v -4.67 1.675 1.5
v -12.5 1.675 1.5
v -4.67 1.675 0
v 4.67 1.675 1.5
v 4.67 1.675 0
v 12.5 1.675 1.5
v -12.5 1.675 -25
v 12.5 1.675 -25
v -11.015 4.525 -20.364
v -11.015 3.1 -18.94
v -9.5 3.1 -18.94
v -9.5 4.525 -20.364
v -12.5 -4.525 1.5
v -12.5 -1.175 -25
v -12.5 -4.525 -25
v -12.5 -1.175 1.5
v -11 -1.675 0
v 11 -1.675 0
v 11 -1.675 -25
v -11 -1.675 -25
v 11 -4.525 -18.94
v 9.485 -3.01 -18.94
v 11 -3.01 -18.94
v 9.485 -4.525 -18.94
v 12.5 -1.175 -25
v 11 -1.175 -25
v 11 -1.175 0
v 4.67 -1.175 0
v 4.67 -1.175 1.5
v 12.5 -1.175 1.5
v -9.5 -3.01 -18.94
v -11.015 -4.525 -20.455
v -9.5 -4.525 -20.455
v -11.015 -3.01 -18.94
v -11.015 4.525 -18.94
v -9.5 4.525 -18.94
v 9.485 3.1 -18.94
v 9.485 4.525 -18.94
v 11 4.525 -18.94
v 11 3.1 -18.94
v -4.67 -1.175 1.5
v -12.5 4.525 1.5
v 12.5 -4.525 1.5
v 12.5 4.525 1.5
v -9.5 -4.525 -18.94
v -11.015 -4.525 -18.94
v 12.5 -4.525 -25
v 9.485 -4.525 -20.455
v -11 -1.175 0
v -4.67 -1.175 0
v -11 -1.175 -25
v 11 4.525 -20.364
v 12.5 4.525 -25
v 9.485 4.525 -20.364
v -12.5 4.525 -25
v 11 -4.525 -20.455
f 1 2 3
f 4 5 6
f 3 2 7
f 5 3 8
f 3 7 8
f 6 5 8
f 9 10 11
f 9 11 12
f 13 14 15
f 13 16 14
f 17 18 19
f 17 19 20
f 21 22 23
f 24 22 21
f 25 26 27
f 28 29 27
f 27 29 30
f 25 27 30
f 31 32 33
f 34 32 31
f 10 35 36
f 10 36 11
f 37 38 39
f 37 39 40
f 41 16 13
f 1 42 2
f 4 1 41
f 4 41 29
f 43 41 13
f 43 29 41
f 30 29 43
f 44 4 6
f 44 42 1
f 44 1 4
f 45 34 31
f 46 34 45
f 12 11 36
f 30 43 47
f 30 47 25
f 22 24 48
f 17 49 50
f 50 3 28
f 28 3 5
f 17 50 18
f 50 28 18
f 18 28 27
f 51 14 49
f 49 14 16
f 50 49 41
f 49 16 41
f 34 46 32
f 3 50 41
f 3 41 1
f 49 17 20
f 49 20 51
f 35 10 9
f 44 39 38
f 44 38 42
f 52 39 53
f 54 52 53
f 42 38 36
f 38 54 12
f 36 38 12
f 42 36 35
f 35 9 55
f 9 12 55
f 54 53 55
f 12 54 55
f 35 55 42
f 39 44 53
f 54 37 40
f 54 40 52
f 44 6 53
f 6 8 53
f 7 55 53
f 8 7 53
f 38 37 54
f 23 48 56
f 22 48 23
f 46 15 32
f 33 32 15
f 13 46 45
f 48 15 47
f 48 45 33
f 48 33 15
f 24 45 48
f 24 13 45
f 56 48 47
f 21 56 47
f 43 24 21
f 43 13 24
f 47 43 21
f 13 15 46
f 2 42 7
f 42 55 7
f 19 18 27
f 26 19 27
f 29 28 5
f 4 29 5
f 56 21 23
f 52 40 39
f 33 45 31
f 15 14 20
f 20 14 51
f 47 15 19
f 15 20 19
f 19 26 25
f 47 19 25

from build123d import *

# Parameters (mm, degrees)
SKETCH1_W           = 9.34
SKETCH1_H           = 3.35
SKETCH1_W_2         = 1.5
SKETCH1_H_2         = 0.5
SKETCH1_W_3         = 6.33
BOSS_EXTRUDE1_DEPTH = 1.5
SKETCH1_6_W         = 1.5
SKETCH1_6_H         = 0.5
BOSS_EXTRUDE4_DEPTH = 25
CAVITY1_START       = -11.015
CAVITY1_DEPTH       = 1.515
CAVITY1_START_2     = 9.485
CAVITY1_2_DEPTH     = 1.515


# Read off the part's stored shape, not the designer's step: Cavity1
with BuildPart() as part:
    # Sketch1 → Boss-Extrude1 (new body)
    with BuildSketch(Plane.XY):
        Rectangle(SKETCH1_W, SKETCH1_H)
        Polygon((11, -1.675), (4.67, -1.675), (-4.67, -1.675), (-11, -1.675), (-12.5, -1.675), (-12.5, -4.525), (12.5, -4.525), (12.5, -1.675), align=None)
        Polygon((-4.67, 1.675), (4.67, 1.675), (12.5, 1.675), (12.5, 4.525), (-12.5, 4.525), (-12.5, 1.675), align=None)
        with Locations((11.75, -1.425)):
            Rectangle(SKETCH1_W_2, SKETCH1_H_2)
        with Locations((7.835, -1.425)):
            Rectangle(SKETCH1_W_3, SKETCH1_H_2)
        with Locations((-11.75, -1.425)):
            Rectangle(SKETCH1_W_2, SKETCH1_H_2)
        with Locations((-7.835, -1.425)):
            Rectangle(SKETCH1_W_3, SKETCH1_H_2)
    extrude(amount=BOSS_EXTRUDE1_DEPTH)

    # Sketch1<6> → Boss-Extrude4 (add)
    with BuildSketch(Plane.XY):
        Polygon((11, -1.675), (4.67, -1.675), (-4.67, -1.675), (-11, -1.675), (-12.5, -1.675), (-12.5, -4.525), (12.5, -4.525), (12.5, -1.675), align=None)
        Polygon((-4.67, 1.675), (4.67, 1.675), (12.5, 1.675), (12.5, 4.525), (-12.5, 4.525), (-12.5, 1.675), align=None)
        with Locations((11.75, -1.425)):
            Rectangle(SKETCH1_6_W, SKETCH1_6_H)
        with Locations((-11.75, -1.425)):
            Rectangle(SKETCH1_6_W, SKETCH1_6_H)
    extrude(amount=-BOSS_EXTRUDE4_DEPTH)

    # Cavity1 outline → Cavity1 (cut)
    with BuildSketch(Plane.YZ.offset(CAVITY1_START)):
        Polygon((-4.525, -18.94), (-4.525, -20.455), (-3.01, -18.94), align=None)
        Polygon((4.525, -18.94), (3.1005, -18.94), (4.525, -20.3645), align=None)
    extrude(amount=CAVITY1_DEPTH, mode=Mode.SUBTRACT)

    # Cavity1 2 outline → Cavity1 2 (cut)
    with BuildSketch(Plane.YZ.offset(CAVITY1_START_2)):
        Polygon((-4.525, -18.94), (-4.525, -20.455), (-3.01, -18.94), align=None)
        Polygon((4.525, -18.94), (3.1005, -18.94), (4.525, -20.3645), align=None)
    extrude(amount=CAVITY1_2_DEPTH, mode=Mode.SUBTRACT)


solid = part.part
